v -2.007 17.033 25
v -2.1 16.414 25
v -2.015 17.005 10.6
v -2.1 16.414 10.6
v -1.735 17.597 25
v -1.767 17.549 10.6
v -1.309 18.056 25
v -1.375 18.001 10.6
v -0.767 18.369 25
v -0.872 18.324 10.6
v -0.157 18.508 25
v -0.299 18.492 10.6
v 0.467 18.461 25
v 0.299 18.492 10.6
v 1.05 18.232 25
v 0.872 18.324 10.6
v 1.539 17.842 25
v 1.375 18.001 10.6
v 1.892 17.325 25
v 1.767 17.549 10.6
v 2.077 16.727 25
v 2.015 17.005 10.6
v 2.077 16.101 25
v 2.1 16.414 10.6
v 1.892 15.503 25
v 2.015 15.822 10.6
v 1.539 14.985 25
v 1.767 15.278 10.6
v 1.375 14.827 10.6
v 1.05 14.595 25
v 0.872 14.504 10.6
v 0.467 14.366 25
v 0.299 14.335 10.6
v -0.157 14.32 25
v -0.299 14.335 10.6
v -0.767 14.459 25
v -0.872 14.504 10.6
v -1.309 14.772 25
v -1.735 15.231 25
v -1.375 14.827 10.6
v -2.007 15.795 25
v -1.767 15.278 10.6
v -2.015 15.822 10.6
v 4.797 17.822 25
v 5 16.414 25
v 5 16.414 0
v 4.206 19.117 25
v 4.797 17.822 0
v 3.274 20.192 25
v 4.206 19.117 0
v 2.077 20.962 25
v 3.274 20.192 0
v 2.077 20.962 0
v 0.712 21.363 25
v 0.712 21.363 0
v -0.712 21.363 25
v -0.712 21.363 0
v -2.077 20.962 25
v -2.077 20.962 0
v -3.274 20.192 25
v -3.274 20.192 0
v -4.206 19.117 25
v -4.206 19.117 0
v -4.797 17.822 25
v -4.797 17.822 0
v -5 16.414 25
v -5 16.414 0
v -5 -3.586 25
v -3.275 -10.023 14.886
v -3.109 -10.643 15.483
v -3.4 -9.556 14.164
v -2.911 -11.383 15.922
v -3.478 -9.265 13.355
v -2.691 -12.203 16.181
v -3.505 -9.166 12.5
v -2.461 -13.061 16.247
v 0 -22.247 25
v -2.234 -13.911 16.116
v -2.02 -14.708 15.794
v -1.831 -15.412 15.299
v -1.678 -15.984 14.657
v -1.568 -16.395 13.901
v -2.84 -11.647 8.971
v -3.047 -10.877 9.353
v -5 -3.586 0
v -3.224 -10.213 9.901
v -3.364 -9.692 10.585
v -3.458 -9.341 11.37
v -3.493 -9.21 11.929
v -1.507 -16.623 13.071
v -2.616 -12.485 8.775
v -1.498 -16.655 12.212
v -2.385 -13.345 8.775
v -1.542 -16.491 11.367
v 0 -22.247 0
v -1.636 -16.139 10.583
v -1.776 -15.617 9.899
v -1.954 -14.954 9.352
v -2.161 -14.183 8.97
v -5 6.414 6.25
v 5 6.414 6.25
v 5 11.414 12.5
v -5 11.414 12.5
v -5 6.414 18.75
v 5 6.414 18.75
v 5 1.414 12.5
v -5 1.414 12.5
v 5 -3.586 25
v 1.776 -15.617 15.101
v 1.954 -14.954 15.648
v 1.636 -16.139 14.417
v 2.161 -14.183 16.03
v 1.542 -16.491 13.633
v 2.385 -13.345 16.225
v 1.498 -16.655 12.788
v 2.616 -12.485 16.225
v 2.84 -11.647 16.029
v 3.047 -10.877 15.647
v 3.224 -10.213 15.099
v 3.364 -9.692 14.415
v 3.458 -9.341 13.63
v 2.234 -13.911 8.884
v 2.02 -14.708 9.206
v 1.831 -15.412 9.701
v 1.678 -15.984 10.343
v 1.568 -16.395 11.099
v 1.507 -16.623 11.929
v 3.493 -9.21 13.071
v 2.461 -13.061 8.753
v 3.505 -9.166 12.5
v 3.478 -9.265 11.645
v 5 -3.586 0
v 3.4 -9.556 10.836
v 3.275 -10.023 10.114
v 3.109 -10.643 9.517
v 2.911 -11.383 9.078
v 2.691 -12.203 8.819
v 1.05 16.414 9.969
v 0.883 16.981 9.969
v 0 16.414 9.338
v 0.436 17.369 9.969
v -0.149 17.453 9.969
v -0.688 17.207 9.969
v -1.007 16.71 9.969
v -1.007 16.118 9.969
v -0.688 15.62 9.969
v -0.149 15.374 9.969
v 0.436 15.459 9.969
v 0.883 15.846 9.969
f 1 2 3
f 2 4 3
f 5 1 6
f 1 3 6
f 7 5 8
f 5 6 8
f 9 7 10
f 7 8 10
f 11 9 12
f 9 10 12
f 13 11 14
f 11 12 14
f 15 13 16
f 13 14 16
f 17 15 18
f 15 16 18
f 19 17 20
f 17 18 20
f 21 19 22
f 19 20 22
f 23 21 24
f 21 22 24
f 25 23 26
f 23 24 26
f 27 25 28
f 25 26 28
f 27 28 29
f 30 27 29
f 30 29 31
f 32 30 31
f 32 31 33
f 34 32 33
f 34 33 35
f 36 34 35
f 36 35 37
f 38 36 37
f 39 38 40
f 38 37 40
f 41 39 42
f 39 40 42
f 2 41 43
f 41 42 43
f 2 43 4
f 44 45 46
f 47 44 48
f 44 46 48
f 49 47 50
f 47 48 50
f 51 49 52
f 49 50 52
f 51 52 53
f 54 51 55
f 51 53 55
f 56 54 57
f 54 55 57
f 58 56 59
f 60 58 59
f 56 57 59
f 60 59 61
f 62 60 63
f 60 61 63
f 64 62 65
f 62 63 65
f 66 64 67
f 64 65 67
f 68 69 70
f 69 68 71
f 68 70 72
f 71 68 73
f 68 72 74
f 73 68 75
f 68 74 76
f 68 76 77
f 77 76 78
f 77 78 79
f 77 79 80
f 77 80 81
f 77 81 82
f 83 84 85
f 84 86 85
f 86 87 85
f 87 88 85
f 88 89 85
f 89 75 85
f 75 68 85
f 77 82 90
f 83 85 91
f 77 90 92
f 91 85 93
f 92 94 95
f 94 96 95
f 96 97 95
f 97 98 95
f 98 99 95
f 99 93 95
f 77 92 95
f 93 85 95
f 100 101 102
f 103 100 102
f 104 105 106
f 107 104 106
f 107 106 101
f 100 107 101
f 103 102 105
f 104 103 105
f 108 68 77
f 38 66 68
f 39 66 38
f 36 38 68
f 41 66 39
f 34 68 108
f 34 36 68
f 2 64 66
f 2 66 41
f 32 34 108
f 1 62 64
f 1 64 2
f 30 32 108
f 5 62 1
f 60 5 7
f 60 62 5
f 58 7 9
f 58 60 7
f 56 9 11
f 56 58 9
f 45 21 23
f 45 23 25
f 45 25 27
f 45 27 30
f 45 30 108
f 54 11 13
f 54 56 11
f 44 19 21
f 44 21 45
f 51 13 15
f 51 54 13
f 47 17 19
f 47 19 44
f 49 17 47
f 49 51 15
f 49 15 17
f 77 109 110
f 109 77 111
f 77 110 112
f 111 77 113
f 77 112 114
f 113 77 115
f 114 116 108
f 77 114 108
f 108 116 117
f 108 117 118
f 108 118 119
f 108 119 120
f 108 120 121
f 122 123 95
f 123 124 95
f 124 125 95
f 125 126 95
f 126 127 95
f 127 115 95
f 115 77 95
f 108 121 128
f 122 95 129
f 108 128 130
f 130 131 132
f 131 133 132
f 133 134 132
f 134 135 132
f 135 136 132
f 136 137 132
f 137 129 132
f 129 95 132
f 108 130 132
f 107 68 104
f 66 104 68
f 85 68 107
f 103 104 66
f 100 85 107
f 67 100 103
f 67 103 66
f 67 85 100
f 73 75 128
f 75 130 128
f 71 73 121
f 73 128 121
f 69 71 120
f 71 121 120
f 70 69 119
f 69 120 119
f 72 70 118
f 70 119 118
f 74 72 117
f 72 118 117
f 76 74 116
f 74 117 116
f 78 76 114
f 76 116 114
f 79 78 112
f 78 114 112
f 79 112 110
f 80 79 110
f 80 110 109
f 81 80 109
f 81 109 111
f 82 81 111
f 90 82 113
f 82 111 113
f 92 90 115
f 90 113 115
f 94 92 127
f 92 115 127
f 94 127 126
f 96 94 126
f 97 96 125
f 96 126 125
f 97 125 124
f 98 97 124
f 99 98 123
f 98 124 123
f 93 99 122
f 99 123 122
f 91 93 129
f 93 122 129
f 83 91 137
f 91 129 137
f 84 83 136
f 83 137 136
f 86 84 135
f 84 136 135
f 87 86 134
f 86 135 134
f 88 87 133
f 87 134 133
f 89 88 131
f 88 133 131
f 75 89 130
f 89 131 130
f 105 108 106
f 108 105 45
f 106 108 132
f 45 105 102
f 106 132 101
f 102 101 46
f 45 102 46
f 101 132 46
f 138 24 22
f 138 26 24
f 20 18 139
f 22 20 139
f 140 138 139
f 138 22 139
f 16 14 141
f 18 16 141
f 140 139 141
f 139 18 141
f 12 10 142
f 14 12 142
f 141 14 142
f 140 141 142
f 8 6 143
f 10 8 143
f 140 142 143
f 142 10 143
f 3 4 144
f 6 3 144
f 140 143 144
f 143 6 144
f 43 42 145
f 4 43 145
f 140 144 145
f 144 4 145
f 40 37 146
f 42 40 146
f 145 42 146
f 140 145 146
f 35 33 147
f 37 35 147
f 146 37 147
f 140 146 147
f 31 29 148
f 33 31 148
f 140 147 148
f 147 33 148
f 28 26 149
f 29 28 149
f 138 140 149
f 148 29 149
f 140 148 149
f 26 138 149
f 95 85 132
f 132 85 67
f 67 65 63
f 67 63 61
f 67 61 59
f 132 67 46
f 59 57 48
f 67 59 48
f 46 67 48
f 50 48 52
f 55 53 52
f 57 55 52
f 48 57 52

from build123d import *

# Parameters (mm, degrees)
F0_W     = 10
F0_H     = 20
F1_DEPTH = 25
F3_DEPTH = 10.001
F4_R     = 3.75
F5_DEPTH = 12.5
F7_D     = 4.2
F7_DEPTH = 14.4
F7_TIP   = 1.2618073


with BuildPart() as f1:
    # F0 (on Top) → F1 (new body)
    with BuildSketch(Plane.XY):
        Polygon((0, -22.2465131165), (5, -3.5862590786), (-5, -3.5862590786), align=None)
        with Locations((0, 6.4137409214)):
            Rectangle(F0_W, F0_H)
        with BuildLine():
            Line((-5, 16.4137409214), (5, 16.4137409214))
            ThreePointArc((5, 16.4137409214), (0, 21.4137409214), (-5, 16.4137409214))
        make_face()
    extrude(amount=F1_DEPTH)

    # F2 (on face) → F3 (cut, through all)
    with BuildSketch(Plane.YZ.offset(5)):
        Polygon((11.4137409214, 12.5), (6.4137409214, 18.75), (1.4137409214, 12.5), (6.4137409214, 6.25), align=None)
    extrude(amount=-F3_DEPTH, mode=Mode.SUBTRACT)

    # F4 (on Right) → F5 (cut, symmetric)
    with BuildSketch(Plane.YZ):
        with Locations((-12.9163860975, 12.5)):
            Circle(F4_R)
    extrude(amount=F5_DEPTH, both=True, mode=Mode.SUBTRACT)

    # F7
    with Locations(Plane.XY.offset(25)):
        with Locations((0, 16.4137409214)):
            Hole(F7_D / 2, depth=F7_DEPTH)
            with Locations((0, 0, -(F7_DEPTH + F7_TIP / 2))):  # 118° drill point
                Cone(0, F7_D / 2, F7_TIP, mode=Mode.SUBTRACT)


solid = f1.part
